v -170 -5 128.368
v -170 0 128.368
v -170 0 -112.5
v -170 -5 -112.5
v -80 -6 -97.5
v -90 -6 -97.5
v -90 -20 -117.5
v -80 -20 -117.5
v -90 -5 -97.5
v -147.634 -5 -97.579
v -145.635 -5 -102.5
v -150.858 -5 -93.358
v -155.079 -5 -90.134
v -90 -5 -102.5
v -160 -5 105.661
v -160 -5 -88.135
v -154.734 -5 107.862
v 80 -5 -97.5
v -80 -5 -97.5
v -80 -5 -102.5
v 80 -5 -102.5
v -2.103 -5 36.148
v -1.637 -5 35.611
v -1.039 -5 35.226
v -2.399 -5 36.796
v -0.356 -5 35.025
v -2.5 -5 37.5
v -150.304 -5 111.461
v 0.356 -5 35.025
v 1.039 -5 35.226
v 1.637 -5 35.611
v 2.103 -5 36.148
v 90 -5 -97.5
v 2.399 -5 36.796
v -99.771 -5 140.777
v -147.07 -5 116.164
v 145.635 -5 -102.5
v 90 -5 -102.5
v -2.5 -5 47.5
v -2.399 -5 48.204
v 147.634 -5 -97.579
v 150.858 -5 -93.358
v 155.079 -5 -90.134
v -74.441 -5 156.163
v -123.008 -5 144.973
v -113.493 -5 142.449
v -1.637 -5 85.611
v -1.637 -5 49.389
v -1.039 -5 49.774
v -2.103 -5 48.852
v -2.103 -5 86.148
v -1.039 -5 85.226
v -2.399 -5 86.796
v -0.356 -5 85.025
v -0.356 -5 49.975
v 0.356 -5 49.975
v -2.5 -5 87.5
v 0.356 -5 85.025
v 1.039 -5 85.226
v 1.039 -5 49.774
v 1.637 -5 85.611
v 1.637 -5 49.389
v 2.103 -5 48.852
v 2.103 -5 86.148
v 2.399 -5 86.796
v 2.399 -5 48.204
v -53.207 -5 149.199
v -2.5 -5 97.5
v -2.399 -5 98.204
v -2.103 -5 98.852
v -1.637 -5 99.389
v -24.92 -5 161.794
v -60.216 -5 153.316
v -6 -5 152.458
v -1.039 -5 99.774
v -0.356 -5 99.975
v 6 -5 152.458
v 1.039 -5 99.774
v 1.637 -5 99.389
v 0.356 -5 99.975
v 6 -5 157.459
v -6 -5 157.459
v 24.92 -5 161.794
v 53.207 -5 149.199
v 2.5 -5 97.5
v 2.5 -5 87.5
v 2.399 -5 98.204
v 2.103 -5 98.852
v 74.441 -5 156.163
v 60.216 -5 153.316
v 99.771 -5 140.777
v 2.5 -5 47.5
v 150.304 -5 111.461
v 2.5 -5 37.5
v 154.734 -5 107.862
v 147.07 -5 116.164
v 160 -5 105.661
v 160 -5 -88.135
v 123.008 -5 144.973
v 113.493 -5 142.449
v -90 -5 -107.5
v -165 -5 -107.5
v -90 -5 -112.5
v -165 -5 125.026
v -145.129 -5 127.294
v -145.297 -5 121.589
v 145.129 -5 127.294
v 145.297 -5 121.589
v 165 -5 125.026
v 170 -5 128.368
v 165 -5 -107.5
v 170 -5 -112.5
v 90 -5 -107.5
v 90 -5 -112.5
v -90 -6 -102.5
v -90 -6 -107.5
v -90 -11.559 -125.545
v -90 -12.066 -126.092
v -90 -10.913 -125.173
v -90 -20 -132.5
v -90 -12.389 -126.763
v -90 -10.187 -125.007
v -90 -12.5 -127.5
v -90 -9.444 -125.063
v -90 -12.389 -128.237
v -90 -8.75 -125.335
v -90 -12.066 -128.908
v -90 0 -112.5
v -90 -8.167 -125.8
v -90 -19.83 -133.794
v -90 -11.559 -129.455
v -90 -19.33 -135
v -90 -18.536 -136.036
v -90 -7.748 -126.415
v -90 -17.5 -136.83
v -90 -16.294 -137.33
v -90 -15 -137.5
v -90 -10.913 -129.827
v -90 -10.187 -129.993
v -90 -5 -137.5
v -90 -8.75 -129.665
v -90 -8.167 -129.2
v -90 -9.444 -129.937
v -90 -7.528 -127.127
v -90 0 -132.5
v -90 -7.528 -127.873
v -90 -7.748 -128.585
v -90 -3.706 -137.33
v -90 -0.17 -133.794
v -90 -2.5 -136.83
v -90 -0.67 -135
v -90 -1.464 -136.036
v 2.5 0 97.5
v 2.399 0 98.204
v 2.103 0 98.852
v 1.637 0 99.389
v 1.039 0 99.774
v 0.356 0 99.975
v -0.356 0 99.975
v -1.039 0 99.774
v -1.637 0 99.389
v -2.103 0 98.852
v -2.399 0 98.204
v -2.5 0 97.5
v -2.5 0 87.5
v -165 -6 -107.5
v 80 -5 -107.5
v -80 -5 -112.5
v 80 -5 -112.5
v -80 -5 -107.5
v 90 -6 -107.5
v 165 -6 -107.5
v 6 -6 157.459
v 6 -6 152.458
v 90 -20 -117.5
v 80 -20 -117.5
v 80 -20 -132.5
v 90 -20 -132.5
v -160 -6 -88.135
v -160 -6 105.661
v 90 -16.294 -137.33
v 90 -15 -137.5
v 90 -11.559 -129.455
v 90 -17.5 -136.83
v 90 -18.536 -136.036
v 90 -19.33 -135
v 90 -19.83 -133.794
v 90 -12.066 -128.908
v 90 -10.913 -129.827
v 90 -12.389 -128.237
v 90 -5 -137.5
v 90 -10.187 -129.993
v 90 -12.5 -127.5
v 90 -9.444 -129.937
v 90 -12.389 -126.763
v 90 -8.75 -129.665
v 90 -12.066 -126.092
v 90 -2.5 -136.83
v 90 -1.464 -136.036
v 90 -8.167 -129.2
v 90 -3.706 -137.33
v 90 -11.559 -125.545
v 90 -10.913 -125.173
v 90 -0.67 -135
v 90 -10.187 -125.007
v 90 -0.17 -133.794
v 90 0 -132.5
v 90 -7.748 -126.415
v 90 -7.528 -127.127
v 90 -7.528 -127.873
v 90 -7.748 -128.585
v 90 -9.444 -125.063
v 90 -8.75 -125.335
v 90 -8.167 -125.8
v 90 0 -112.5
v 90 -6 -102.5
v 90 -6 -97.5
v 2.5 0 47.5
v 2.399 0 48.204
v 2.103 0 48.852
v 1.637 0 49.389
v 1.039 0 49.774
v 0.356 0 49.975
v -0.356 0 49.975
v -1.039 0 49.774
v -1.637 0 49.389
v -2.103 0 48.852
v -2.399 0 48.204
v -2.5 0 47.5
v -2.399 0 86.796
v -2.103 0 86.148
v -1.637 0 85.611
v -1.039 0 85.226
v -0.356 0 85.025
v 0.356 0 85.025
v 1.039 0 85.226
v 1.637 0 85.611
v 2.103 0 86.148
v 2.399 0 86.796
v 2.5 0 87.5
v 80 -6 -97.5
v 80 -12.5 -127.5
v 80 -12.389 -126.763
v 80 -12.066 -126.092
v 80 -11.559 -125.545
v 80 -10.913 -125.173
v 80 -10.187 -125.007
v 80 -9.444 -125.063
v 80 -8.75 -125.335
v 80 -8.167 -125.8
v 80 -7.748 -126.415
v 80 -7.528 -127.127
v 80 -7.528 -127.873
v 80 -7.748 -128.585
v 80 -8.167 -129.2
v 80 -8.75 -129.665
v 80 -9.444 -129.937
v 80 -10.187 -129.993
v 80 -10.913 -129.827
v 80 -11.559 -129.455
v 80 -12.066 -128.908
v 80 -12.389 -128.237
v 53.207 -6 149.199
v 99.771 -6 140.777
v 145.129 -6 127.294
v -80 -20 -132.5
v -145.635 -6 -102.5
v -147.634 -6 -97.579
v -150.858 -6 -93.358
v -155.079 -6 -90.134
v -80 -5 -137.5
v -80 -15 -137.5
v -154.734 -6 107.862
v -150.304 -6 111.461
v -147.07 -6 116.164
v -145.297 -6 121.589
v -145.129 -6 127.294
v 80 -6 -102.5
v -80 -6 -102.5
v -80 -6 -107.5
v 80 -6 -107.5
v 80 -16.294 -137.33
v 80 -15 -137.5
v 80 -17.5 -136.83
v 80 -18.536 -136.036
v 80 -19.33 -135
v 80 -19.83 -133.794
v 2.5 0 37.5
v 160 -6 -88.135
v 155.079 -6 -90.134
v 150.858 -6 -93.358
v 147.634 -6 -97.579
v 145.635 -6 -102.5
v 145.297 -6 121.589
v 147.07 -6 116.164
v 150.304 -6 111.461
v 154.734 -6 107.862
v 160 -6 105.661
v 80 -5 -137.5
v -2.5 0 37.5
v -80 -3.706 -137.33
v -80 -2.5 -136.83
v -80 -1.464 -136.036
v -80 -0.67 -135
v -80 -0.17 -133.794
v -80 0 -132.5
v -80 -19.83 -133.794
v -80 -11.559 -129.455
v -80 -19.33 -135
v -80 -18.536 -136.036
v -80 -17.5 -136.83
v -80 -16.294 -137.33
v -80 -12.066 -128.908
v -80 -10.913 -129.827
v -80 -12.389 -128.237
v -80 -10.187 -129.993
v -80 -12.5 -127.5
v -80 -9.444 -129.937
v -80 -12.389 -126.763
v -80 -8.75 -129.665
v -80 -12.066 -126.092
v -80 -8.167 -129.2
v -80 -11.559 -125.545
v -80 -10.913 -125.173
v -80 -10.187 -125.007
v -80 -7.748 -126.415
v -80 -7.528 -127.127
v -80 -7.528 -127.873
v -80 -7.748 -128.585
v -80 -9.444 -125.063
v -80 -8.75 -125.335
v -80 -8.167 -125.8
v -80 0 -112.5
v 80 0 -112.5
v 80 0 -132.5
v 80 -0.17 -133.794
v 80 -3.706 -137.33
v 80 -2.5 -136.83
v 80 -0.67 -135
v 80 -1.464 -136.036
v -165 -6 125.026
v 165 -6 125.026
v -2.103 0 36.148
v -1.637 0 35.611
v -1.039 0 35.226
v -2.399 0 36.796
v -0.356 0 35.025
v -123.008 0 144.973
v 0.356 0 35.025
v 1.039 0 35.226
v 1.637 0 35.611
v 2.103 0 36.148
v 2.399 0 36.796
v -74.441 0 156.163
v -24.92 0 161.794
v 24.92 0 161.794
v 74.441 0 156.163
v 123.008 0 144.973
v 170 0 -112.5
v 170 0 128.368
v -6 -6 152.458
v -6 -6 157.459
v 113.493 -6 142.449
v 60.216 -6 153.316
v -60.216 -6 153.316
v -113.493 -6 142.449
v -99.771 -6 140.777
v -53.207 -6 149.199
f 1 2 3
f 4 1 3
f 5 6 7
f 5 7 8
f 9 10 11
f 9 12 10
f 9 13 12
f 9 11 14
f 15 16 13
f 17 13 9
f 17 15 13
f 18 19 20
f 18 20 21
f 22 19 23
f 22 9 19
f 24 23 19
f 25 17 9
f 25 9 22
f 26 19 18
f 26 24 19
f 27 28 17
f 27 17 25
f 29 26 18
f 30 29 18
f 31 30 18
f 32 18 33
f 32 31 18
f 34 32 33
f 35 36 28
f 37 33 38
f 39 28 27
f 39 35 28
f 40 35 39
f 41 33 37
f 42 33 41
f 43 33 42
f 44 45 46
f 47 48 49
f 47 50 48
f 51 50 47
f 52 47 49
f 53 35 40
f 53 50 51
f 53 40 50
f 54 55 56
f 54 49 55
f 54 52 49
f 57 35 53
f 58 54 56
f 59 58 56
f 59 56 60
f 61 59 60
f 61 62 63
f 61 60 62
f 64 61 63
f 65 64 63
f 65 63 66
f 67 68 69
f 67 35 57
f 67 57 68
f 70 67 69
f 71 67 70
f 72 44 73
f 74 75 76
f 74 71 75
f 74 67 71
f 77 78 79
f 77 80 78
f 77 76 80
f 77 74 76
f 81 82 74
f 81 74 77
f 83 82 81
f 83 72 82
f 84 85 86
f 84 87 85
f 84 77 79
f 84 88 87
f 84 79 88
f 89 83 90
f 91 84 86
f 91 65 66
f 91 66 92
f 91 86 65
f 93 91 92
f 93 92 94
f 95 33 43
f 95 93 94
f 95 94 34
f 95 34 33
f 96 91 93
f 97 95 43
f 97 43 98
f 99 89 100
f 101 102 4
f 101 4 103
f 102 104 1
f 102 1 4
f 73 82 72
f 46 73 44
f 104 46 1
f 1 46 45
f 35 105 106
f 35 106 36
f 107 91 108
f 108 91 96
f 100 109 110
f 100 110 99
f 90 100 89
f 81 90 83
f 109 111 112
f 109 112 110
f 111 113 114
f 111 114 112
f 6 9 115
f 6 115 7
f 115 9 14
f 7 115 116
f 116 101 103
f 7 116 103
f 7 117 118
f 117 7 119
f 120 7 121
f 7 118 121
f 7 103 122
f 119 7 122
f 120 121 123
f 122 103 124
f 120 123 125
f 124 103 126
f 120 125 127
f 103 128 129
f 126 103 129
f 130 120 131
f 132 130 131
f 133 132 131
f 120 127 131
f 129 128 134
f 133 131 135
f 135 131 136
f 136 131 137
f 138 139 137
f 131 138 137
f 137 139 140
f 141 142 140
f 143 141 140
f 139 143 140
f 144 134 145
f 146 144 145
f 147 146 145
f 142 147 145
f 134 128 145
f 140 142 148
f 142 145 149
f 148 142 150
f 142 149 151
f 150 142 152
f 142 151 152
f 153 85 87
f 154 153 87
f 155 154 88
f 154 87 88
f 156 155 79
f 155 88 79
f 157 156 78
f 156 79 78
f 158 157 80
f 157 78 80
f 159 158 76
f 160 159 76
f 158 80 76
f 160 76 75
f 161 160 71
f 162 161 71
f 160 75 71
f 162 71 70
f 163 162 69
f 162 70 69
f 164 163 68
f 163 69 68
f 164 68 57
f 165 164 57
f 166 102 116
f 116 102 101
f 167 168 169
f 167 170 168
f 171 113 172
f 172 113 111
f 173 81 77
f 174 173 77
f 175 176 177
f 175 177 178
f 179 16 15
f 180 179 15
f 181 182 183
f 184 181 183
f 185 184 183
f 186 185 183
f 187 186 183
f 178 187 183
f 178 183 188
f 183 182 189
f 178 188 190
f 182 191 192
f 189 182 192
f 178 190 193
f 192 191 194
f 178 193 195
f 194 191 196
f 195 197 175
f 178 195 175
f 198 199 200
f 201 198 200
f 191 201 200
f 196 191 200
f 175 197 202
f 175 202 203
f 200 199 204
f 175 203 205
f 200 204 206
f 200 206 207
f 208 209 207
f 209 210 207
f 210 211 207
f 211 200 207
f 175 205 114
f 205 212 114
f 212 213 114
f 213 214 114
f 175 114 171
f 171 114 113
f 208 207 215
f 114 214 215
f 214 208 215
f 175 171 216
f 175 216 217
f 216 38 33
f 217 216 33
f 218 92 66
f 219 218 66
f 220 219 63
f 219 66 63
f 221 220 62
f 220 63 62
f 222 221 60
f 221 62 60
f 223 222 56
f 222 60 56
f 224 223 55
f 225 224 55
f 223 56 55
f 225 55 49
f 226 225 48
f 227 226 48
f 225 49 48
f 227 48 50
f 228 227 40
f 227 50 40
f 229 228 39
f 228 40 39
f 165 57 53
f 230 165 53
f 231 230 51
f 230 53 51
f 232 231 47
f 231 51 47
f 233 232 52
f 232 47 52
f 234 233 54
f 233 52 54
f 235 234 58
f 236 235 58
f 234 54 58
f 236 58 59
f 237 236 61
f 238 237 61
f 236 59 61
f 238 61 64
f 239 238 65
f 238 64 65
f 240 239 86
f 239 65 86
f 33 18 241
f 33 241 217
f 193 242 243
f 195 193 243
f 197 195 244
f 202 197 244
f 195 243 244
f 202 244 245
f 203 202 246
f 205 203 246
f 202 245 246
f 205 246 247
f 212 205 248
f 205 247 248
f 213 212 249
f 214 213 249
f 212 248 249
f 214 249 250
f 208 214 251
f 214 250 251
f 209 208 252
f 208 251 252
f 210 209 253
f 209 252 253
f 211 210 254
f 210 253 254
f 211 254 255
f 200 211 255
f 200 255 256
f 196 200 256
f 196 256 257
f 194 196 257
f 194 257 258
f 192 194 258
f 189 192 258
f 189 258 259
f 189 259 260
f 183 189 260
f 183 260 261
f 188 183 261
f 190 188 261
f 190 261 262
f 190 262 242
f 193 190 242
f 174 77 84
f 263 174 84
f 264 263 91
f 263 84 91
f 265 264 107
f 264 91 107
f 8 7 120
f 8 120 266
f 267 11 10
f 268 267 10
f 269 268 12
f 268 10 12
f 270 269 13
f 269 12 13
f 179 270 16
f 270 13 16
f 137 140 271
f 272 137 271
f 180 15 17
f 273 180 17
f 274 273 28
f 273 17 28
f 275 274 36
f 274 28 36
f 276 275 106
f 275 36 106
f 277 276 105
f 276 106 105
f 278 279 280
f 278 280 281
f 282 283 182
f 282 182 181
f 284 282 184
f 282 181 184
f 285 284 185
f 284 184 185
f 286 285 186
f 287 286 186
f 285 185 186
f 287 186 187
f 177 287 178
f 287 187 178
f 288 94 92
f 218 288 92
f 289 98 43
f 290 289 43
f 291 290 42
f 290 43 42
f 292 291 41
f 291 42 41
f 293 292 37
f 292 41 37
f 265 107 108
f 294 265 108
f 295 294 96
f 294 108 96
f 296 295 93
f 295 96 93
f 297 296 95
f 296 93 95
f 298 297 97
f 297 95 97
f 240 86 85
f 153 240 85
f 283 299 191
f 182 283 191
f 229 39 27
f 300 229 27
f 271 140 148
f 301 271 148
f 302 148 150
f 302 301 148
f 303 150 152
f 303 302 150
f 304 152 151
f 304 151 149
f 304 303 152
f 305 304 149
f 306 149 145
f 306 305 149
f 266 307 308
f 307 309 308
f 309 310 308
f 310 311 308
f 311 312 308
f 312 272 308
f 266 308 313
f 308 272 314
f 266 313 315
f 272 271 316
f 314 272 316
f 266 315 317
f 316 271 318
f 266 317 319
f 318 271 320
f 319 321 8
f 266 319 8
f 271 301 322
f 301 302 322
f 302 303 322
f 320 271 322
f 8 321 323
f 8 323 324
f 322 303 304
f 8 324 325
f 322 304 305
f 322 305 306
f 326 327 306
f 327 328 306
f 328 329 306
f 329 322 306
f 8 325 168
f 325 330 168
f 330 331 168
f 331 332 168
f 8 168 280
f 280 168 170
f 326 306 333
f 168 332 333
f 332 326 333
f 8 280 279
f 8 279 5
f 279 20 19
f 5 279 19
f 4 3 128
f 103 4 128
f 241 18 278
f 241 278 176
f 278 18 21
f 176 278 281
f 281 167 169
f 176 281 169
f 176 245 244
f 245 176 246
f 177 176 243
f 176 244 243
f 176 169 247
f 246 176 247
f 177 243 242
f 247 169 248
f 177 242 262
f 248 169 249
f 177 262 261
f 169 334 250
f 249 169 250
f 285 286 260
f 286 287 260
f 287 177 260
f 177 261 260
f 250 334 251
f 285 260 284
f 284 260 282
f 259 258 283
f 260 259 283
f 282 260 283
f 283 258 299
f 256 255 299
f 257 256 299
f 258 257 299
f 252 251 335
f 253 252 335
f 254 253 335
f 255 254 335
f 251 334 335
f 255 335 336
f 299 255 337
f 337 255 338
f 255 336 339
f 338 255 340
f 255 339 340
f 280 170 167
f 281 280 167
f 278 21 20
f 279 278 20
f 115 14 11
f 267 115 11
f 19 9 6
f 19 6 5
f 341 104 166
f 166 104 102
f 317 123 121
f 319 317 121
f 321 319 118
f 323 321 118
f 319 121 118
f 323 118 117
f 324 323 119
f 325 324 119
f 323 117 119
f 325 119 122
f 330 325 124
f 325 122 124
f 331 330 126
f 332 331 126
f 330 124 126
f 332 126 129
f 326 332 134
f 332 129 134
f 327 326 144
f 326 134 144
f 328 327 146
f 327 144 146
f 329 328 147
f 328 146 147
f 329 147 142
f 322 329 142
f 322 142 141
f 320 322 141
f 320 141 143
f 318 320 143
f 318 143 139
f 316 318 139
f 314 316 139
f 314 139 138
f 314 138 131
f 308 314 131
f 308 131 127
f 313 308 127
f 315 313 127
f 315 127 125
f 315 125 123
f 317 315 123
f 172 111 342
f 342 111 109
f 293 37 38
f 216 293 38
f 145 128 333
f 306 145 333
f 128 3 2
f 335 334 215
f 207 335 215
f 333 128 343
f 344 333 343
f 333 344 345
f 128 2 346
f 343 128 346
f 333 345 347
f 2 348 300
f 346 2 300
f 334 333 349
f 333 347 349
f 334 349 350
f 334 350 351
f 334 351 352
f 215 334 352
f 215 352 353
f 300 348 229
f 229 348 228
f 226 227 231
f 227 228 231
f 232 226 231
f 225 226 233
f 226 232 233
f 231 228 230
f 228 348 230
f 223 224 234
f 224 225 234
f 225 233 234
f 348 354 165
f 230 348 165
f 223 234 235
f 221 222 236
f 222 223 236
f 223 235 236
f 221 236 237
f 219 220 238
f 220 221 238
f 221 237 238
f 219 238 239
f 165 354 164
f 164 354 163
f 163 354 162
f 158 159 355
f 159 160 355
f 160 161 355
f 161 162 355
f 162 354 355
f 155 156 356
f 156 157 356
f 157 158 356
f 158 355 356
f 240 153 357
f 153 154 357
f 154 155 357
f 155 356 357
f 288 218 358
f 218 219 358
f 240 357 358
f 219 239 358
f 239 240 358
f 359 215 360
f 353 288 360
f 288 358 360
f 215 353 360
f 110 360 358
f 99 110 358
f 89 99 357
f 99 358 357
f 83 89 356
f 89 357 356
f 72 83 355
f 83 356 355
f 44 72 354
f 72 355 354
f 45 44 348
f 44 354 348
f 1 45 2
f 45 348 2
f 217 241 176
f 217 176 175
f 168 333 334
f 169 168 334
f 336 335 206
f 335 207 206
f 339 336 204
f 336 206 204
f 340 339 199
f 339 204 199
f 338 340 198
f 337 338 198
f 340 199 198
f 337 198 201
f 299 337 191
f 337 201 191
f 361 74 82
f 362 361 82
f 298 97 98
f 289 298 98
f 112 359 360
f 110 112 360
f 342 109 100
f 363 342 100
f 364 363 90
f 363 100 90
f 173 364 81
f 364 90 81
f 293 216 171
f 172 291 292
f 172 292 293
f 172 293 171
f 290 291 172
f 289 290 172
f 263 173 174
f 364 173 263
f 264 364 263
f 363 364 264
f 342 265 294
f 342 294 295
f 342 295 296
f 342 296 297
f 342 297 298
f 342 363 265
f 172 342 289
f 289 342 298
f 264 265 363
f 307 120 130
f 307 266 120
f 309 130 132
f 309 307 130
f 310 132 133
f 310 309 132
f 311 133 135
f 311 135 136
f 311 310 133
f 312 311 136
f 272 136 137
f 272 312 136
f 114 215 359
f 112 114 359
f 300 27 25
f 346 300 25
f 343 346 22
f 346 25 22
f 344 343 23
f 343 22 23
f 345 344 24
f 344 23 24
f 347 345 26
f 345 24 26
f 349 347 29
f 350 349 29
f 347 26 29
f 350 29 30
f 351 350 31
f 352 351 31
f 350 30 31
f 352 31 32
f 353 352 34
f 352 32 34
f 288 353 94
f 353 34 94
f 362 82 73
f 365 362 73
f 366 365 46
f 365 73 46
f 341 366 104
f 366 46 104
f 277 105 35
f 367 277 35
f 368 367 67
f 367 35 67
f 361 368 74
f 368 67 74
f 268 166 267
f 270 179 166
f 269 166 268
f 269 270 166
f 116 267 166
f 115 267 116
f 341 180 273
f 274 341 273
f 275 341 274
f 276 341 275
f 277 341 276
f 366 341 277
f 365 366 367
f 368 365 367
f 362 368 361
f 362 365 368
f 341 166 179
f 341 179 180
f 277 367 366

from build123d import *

# Parameters (mm, degrees)
F0_W       = 10
F0_H       = 15
F1_DEPTH   = 5
F3_DEPTH   = 1
F0_H_2     = 25
F4_DEPTH   = 20
F5_SIZE2   = 20
F5_SIZE    = 14
F5_2_SIZE2 = 20
F5_2_SIZE  = 14
F6_R       = 5
F8_D       = 5
F10_DEPTH  = 5


# Not quite as in the source:
# - a feature names something its author has since deleted; it is built from what else it names


with BuildPart() as f1:
    # F0 (on Front) → F1 (new body)
    with BuildSketch(Plane.XZ):
        with BuildLine():
            ThreePointArc((170, 128.3675199291), (0, 162.5), (-170, 128.3675199291))
            Line((-170, 128.3675199291), (-170, -112.5))
            Line((-170, -112.5), (-90, -112.5))
            Line((-90, -112.5), (-90, -97.5))
            Line((-90, -97.5), (-80, -97.5))
            Line((-80, -97.5), (-80, -112.5))
            Line((-80, -112.5), (80, -112.5))
            Line((80, -112.5), (80, -97.5))
            Line((80, -97.5), (90, -97.5))
            Line((90, -97.5), (90, -112.5))
            Line((90, -112.5), (170, -112.5))
            Line((170, -112.5), (170, 128.3675199291))
        make_face()
        with Locations((-85, -105)):
            Rectangle(F0_W, F0_H)
        with Locations((85, -105)):
            Rectangle(F0_W, F0_H)
    extrude(amount=F1_DEPTH)

    # F2 (on face) → F3 (join)
    with BuildSketch(Plane.XZ.offset(5)):
        with BuildLine():
            ThreePointArc((-6, 157.4586583244), (-87.0242594123, 148.7148510214), (-165, 125.0258523247))
            Line((-165, 125.0258523247), (-165, -107.5))
            Line((-165, -107.5), (165, -107.5))
            Line((165, -107.5), (165, 125.0258523247))
            ThreePointArc((165, 125.0258523247), (87.0242594123, 148.7148510214), (6, 157.4586583244))
            Line((6, 157.4586583244), (6, 152.4581780262))
            ThreePointArc((6, 152.4581780262), (76.6048494822, 145.628140857), (145.1290810133, 127.294459524))
            ThreePointArc((145.1290810133, 127.294459524), (148.5184044395, 113.696377148), (160, 105.6609355937))
            Line((160, 105.6609355937), (160, -88.135083269))
            ThreePointArc((160, -88.135083269), (150.8578643763, -93.3578643763), (145.635083269, -102.5))
            Line((145.635083269, -102.5), (-145.635083269, -102.5))
            ThreePointArc((-145.635083269, -102.5), (-150.8578643763, -93.3578643763), (-160, -88.135083269))
            Line((-160, -88.135083269), (-160, 105.6609355937))
            ThreePointArc((-160, 105.6609355937), (-148.5184044395, 113.696377148), (-145.1290810133, 127.294459524))
            ThreePointArc((-145.1290810133, 127.294459524), (-76.6048494822, 145.628140857), (-6, 152.4581780262))
            Line((-6, 152.4581780262), (-6, 157.4586583244))
        make_face()
    extrude(amount=F3_DEPTH)

    # F0 (on Front) → F4 (join)
    with BuildSketch(Plane.XZ):
        with Locations((-85, -125)):
            Rectangle(F0_W, F0_H_2)
        with Locations((85, -125)):
            Rectangle(F0_W, F0_H_2)
        with Locations((85, -105)):
            Rectangle(F0_W, F0_H)
        with Locations((-85, -105)):
            Rectangle(F0_W, F0_H)
    extrude(amount=F4_DEPTH)

    # F5
    f5_edges = [f1.edges().sort_by_distance(p)[0] for p in [
        (85, -20, -97.5),
    ]]
    f5_side = f1.faces().sort_by_distance((85, -12.5, -97.5))[0]
    chamfer(f5_edges, length=F5_SIZE, length2=F5_SIZE2, reference=f5_side)

    # F5#2
    f5_2_edges = [f1.edges().sort_by_distance(p)[0] for p in [
        (-85, -20, -97.5),
    ]]
    f5_2_side = f1.faces().sort_by_distance((-85, -12.5, -97.5))[0]
    chamfer(f5_2_edges, length=F5_2_SIZE, length2=F5_2_SIZE2, reference=f5_2_side)

    # F6
    f6_edges = [f1.edges().sort_by_distance(p)[0] for p in [
        (-85, -20, -137.5),
        (85, -20, -137.5),
        (-85, 0, -137.5),
        (85, 0, -137.5),
    ]]
    fillet(f6_edges, radius=F6_R)

    # F8 (through all)
    with Locations(Plane.YZ.offset(90)):
        with Locations((-10, -127.5)):
            Hole(F8_D / 2)

    # F9 (on face) → F10 (cut)
    with BuildSketch(Plane.XZ.offset(5)):
        with BuildLine():
            Line((2.5, 87.5), (2.5, 97.5))
            ThreePointArc((2.5, 97.5), (0, 100), (-2.5, 97.5))
            Line((-2.5, 97.5), (-2.5, 87.5))
            ThreePointArc((-2.5, 87.5), (0, 85), (2.5, 87.5))
        make_face()
        with BuildLine():
            Line((2.5, 37.5), (2.5, 47.5))
            ThreePointArc((2.5, 47.5), (0, 50), (-2.5, 47.5))
            Line((-2.5, 47.5), (-2.5, 37.5))
            ThreePointArc((-2.5, 37.5), (0, 35), (2.5, 37.5))
        make_face()
    extrude(amount=-F10_DEPTH, mode=Mode.SUBTRACT)


solid = f1.part
